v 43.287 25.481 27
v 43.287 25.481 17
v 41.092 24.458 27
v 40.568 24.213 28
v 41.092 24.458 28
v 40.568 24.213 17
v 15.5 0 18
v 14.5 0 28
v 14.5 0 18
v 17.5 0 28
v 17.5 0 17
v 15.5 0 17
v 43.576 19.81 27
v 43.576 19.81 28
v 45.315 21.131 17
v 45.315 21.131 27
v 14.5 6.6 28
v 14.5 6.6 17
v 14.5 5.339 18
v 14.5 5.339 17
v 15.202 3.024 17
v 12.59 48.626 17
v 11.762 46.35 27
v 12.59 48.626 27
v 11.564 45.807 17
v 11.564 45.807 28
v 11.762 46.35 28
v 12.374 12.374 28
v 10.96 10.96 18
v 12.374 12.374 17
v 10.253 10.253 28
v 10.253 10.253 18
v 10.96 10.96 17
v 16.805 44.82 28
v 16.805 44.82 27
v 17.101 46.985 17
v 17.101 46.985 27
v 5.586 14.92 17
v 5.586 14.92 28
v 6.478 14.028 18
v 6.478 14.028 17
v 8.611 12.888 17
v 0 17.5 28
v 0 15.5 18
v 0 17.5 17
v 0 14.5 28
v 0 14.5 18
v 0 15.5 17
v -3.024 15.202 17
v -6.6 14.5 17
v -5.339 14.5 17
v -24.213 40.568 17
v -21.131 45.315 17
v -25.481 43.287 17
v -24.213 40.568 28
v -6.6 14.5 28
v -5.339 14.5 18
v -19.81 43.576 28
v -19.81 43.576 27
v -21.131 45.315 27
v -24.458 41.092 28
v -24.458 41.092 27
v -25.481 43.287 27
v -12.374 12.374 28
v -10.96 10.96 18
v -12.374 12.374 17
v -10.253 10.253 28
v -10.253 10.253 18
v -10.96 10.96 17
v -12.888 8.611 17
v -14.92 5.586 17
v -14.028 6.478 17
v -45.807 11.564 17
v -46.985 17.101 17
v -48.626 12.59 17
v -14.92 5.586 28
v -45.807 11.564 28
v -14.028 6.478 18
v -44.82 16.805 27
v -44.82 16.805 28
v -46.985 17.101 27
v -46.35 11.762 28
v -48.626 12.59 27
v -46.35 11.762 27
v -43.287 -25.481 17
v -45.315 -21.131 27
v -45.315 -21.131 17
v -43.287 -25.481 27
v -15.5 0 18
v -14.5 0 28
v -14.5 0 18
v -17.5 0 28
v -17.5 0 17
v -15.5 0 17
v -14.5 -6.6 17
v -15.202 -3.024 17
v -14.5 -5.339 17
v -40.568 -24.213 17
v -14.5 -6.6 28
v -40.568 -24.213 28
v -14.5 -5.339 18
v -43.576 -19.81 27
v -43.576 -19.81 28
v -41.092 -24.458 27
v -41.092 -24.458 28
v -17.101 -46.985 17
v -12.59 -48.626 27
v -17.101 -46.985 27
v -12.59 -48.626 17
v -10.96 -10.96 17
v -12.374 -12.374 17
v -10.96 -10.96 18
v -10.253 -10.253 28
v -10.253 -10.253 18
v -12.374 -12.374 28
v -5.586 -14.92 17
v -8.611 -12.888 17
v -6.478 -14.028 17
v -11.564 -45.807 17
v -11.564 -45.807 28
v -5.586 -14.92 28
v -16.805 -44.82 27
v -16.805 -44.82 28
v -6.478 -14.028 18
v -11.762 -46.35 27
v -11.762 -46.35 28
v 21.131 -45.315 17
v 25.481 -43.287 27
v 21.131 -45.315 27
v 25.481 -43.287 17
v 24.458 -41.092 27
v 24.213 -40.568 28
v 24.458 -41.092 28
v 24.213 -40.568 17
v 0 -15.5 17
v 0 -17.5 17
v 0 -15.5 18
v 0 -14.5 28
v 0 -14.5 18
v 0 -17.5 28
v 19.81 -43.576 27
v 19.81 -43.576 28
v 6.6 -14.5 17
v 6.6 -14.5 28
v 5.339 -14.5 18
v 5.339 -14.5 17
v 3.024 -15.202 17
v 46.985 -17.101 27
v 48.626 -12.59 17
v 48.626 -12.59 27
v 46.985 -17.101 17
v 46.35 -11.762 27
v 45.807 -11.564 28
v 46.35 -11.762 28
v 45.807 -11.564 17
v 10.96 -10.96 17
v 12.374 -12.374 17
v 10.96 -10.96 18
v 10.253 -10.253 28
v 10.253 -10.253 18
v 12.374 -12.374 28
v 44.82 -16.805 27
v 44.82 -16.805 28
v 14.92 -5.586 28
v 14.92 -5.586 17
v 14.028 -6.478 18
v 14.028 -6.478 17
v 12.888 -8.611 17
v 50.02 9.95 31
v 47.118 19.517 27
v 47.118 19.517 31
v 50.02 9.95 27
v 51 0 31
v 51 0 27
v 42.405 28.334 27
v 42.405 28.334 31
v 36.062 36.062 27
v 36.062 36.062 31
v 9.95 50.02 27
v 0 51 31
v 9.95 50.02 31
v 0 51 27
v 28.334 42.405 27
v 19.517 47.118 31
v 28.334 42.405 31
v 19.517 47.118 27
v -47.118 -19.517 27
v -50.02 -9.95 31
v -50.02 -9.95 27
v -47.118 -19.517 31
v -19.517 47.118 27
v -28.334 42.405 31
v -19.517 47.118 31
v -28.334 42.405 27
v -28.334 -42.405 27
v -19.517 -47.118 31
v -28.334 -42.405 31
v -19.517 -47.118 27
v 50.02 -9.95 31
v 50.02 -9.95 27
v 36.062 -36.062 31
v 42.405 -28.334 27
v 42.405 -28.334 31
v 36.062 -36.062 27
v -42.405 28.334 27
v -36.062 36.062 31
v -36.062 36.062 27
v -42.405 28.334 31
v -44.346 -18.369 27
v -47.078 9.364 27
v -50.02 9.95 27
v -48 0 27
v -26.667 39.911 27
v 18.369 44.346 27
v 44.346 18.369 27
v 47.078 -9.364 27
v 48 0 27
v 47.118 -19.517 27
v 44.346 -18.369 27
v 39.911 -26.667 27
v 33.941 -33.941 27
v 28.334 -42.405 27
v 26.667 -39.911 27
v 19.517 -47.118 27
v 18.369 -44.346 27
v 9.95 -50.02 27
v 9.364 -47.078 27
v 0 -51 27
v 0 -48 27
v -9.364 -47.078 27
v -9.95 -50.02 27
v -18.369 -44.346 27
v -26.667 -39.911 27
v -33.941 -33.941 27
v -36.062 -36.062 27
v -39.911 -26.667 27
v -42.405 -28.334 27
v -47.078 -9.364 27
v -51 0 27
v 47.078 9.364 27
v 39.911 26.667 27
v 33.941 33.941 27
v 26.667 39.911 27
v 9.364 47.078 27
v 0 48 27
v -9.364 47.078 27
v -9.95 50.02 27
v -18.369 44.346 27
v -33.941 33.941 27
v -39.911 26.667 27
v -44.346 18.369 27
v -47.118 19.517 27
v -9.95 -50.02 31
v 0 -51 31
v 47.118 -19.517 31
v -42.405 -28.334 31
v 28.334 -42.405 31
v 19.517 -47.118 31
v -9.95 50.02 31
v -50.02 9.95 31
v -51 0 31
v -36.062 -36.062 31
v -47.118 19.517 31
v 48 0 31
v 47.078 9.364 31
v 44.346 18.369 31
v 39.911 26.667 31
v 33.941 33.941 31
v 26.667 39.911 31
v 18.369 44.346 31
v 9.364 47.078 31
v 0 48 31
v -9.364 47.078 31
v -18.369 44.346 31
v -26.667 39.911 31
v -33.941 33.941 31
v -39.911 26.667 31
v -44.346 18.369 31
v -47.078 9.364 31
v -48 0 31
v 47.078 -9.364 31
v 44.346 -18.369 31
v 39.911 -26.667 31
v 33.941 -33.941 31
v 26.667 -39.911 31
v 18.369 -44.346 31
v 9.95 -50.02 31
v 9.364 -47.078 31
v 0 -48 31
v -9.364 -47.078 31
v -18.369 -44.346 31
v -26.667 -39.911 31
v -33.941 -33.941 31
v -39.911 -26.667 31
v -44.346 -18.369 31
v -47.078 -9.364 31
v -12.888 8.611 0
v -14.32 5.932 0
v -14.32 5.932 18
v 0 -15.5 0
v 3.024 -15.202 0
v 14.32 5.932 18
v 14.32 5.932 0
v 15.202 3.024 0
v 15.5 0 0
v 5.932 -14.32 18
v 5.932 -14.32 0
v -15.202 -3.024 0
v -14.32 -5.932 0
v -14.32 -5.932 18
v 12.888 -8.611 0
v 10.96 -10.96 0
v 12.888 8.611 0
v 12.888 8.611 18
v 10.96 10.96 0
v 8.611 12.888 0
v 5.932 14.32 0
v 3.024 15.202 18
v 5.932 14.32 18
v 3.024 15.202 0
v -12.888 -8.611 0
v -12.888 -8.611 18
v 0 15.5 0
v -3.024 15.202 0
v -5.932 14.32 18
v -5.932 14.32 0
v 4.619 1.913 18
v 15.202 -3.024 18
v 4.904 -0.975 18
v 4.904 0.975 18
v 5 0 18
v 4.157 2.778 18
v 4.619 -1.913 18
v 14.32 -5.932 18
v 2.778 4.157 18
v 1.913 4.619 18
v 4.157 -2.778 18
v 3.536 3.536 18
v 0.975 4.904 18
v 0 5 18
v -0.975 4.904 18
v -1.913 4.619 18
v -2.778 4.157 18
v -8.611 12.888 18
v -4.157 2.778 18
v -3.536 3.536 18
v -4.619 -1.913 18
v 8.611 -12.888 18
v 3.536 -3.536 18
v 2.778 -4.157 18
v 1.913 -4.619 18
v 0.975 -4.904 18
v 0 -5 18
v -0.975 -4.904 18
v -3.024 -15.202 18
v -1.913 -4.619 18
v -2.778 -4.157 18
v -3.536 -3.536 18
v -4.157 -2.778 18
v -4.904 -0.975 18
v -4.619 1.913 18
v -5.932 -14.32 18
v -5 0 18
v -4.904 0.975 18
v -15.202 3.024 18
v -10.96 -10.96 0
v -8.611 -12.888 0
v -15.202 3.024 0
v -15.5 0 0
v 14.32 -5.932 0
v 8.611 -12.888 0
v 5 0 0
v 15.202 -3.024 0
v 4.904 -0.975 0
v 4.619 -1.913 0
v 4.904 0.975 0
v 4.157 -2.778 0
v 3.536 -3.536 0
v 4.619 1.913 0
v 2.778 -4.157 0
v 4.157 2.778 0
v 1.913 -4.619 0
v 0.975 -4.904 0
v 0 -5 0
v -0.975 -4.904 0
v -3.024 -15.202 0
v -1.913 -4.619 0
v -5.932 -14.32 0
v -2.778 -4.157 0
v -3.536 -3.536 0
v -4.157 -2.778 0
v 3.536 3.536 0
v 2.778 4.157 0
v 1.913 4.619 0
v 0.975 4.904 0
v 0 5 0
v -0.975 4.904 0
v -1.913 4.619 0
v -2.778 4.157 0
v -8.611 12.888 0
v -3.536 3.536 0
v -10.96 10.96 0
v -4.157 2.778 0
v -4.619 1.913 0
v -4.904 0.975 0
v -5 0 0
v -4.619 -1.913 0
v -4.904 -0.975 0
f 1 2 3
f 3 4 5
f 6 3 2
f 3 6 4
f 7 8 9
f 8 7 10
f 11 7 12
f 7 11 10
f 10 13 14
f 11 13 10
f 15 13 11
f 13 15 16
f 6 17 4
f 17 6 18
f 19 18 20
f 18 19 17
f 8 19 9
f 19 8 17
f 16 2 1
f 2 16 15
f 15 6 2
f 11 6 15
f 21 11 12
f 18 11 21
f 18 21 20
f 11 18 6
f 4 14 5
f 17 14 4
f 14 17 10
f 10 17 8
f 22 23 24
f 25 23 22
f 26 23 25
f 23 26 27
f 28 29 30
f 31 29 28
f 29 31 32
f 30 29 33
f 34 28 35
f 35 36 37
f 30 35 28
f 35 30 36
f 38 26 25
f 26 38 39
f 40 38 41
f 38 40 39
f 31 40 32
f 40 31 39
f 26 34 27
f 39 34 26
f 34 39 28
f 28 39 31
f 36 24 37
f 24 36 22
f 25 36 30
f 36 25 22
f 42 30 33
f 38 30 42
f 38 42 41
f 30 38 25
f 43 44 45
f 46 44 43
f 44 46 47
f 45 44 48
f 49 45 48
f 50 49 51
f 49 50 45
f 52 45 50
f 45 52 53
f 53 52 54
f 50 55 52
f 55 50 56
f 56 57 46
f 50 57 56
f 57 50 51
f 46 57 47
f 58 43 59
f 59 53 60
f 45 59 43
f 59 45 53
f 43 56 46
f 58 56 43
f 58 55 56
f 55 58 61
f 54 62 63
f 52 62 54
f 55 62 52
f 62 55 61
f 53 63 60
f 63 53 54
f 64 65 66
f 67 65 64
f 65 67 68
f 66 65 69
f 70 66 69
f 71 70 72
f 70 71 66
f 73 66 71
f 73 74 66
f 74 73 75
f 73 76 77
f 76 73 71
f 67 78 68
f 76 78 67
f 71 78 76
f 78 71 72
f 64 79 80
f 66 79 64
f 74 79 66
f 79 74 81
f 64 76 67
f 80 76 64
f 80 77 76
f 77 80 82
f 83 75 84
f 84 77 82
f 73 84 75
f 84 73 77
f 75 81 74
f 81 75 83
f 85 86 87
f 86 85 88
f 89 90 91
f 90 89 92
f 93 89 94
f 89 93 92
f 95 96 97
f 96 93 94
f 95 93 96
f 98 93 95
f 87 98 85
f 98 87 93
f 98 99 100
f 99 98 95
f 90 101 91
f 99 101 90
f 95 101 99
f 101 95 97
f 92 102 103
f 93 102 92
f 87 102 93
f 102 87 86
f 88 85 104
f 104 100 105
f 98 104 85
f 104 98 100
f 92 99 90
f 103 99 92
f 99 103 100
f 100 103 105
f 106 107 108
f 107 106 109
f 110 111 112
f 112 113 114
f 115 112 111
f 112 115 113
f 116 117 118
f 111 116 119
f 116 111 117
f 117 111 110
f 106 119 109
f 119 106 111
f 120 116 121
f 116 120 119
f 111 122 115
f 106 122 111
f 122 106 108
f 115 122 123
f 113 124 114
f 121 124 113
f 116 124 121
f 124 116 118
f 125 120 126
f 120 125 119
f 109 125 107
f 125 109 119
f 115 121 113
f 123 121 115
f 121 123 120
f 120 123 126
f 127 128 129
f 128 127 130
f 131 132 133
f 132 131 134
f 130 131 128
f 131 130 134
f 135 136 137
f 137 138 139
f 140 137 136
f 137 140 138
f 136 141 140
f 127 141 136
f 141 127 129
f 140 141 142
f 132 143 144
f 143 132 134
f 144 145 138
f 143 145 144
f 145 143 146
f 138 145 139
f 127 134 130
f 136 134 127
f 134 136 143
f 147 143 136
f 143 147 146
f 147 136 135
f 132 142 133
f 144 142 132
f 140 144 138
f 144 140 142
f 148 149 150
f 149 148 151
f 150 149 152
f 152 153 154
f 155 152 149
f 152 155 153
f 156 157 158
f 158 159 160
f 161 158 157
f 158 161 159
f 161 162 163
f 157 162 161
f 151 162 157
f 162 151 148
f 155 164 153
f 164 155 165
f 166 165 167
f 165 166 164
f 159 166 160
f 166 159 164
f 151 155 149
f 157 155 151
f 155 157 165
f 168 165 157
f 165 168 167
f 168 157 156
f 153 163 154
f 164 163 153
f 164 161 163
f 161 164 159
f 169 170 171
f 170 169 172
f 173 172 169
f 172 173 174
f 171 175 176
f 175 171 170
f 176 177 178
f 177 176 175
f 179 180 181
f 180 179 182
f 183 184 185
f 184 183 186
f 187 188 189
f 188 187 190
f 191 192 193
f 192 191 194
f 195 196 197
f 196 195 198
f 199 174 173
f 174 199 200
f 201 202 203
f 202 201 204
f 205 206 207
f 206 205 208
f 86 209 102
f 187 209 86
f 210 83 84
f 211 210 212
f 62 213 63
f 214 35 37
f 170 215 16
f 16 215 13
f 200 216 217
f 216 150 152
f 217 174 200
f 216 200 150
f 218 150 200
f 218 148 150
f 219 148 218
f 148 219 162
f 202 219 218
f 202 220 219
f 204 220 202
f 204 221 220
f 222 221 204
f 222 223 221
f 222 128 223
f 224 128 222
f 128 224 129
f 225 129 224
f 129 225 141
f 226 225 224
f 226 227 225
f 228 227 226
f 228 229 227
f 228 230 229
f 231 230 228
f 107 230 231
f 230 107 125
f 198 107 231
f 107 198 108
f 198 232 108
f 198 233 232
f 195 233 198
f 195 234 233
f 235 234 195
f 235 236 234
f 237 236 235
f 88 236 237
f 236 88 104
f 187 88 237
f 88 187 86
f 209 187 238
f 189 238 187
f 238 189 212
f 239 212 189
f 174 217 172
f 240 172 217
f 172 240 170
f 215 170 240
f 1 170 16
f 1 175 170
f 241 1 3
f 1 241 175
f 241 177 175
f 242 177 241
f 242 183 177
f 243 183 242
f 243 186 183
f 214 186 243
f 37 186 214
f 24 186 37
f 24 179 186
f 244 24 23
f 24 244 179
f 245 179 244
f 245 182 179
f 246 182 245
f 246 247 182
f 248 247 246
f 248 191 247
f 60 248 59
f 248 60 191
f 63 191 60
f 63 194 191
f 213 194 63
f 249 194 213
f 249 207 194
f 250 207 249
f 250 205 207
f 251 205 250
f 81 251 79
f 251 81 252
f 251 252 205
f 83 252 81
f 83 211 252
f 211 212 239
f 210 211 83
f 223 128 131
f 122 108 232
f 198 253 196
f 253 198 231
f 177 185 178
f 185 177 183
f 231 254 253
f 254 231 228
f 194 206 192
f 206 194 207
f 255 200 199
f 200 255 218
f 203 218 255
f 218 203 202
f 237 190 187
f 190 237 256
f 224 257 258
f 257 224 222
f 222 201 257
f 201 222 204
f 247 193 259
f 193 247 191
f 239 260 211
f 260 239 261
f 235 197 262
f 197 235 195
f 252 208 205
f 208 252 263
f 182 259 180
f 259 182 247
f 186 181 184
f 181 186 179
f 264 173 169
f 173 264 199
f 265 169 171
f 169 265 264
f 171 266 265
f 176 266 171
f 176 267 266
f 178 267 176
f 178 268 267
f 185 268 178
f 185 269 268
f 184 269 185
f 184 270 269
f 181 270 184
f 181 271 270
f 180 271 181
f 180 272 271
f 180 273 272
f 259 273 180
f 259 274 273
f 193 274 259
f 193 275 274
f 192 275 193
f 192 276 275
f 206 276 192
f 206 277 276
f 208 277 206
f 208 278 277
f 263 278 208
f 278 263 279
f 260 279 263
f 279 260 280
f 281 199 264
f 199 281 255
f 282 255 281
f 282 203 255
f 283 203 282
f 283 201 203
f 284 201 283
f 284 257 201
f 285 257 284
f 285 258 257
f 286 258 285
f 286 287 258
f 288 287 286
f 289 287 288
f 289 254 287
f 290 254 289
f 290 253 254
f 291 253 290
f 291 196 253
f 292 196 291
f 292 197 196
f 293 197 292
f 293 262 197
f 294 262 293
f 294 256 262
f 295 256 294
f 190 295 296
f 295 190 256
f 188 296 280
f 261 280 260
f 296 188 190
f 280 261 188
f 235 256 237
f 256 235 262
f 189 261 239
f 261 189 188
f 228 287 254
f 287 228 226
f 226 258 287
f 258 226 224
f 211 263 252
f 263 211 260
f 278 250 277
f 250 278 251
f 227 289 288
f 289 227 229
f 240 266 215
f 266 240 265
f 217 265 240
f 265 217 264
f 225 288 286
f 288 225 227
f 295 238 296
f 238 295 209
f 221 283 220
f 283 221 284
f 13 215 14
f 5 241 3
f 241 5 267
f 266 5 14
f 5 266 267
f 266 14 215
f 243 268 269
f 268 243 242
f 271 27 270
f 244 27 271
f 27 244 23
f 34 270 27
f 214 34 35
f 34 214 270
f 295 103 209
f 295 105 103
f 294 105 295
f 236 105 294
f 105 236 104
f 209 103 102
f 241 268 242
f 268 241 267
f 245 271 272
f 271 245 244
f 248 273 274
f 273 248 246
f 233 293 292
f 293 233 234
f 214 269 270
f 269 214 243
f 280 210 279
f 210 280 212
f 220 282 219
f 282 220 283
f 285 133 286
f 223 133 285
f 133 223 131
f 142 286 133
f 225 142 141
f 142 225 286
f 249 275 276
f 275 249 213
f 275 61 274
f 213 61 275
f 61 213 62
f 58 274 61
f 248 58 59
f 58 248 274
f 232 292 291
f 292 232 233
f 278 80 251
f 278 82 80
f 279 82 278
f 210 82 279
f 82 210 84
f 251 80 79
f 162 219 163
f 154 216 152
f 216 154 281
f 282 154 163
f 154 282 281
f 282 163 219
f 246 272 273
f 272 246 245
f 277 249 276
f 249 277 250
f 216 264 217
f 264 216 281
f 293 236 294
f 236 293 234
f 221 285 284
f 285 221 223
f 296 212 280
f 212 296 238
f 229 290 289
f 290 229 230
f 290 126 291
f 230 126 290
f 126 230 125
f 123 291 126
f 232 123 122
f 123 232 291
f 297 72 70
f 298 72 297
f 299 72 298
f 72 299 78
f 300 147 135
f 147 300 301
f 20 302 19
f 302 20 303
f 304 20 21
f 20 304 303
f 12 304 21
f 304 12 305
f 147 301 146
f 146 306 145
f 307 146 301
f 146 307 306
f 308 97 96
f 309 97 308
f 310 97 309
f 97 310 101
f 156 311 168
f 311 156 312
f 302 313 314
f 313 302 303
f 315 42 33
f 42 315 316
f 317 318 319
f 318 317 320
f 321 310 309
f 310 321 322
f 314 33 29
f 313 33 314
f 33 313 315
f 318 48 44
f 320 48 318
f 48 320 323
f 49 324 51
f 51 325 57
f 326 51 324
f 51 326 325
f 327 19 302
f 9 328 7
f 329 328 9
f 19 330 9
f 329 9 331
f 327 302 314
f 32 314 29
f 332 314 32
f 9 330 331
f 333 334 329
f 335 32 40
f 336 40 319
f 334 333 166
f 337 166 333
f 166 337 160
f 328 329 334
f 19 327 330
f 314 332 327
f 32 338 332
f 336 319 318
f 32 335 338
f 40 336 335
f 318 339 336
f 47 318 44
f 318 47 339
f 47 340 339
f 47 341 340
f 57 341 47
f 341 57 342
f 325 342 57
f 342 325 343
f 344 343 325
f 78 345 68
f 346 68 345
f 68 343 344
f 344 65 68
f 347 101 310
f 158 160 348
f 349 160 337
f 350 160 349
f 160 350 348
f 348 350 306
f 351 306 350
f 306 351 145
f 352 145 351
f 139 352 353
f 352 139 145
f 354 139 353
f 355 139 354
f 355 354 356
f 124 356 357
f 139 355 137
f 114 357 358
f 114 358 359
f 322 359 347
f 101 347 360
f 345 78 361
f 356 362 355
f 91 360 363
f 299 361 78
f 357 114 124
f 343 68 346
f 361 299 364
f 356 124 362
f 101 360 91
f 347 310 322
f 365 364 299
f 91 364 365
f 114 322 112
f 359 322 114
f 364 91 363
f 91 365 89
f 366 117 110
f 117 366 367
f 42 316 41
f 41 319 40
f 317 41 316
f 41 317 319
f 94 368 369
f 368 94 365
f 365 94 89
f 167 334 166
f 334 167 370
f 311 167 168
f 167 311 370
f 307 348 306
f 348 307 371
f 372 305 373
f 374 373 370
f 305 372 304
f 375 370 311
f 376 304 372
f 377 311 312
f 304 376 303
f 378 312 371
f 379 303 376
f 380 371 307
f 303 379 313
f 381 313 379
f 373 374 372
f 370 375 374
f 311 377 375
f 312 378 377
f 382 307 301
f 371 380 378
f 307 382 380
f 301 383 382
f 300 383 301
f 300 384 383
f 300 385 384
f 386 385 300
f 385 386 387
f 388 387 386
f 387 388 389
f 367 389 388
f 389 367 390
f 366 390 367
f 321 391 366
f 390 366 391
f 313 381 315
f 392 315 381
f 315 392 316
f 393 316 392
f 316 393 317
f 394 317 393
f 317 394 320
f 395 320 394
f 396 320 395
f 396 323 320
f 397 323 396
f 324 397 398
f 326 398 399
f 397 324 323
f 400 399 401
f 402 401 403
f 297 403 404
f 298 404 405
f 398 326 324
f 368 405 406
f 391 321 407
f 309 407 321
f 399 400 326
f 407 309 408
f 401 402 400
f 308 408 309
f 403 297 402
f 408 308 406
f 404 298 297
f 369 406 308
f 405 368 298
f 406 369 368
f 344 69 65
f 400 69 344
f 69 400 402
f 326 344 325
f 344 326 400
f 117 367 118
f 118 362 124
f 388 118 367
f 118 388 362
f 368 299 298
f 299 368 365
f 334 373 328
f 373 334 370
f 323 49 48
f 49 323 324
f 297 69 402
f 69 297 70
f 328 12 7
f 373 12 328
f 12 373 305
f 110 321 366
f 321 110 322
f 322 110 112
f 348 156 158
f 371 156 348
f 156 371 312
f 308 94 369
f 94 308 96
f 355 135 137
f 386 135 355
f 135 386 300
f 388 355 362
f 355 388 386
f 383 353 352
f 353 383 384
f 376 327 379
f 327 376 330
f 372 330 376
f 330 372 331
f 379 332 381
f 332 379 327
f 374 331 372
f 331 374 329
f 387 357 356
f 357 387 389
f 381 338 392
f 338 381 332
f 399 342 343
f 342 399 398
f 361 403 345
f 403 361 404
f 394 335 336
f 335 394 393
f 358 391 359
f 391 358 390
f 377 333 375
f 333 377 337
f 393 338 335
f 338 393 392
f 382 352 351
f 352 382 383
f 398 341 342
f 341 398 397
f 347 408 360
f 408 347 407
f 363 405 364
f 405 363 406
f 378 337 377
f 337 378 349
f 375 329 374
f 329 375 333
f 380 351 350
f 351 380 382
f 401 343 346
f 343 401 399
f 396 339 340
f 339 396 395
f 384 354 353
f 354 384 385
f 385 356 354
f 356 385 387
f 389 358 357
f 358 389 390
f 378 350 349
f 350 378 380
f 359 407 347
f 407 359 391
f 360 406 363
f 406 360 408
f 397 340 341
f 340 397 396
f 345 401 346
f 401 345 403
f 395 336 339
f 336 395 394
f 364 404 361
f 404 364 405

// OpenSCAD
$fn = 32;

// ----------------------------------------------------------------------
// Impeller: 100 mm, 8 blades, 31 mm tall
// ----------------------------------------------------------------------

// --- parameters (mm) ---
hub_d = 31;               // hub diameter
hub_h = 18;               // hub height
imp_d = 100;              // outer diameter over the blades
blades = 8;               // number of blades
blade_t = 3;              // blade thickness
blade_h = 10;             // blade height
blade_in_r = 14.5;        // blade root radius
blade_out_r = 47;         // blade tip radius
sweep = 25;               // blade sweep, degrees
bore_d = 10;              // shaft bore
shroud_h = 3;             // shroud ring thickness
shroud_d = 102;           // shroud outside diameter

module hub() {
  cylinder(h = hub_h, d = hub_d);
}

module blade() {
  /* blade swept between two boxes: hull of the root and the tip section */
  hull() {
    translate([blade_in_r, 0, hub_h - 1])
      cube([blade_t, blade_t * 2.2, blade_h + 1], center = false);
    rotate([0, 0, sweep])
      translate([blade_out_r, 0, hub_h - 1])
        cube([blade_t, blade_t * 1.6, blade_h + 1], center = false);
  }
}

module blades() {
  for (i = [0 : blades - 1])
    rotate([0, 0, i * 360 / blades]) blade();
}

module shroud() {
  translate([0, 0, hub_h + blade_h - 1])
    difference() {
      cylinder(h = shroud_h + 1, d = shroud_d);
      translate([0, 0, -1]) cylinder(h = shroud_h + 3, d = shroud_d - 2 * 3);
    }
}

difference() {
  union() {
    hub();
    blades();
    shroud();
  }
  translate([0, 0, -1]) cylinder(h = hub_h + blade_h + shroud_h + 3, d = bore_d);
}
